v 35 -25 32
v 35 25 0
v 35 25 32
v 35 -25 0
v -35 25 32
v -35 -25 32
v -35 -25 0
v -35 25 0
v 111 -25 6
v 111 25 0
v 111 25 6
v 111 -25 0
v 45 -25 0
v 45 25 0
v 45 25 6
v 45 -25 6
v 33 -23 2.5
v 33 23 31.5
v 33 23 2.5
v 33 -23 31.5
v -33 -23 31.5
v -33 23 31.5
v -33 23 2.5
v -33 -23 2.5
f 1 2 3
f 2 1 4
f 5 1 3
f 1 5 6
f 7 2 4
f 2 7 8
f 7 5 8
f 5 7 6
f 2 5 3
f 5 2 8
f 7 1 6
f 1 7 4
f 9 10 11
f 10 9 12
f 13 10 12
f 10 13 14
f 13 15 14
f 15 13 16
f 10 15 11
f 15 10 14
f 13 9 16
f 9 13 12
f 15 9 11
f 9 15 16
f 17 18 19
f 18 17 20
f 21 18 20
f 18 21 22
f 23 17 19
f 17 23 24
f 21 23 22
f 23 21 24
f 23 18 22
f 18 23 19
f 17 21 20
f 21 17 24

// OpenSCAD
// Two-part enclosure for a small electronics board (e.g. Arduino-based temperature logger)
// Prints together: box on the left, lid (upside down) on the right, with a 10 mm gap.

// ---------------- Parameters ----------------
box_x      = 70;    // box outer length (X)
box_y      = 50;    // box outer width (Y)
box_z      = 30;    // box height (Z)
wall       = 2;     // box wall thickness
floor      = 2;     // box floor thickness

lip_t      = 1.5;   // lid lip wall thickness
lip_h      = 4;     // lid lip height (from plate top)
lip_x      = 65.6;  // lid lip outer length (X)
lip_y      = 45.6;  // lid lip outer width (Y)
clearance  = 0.2;   // side clearance between lip and box opening

plate_t    = 2;     // lid plate thickness
gap        = 10;    // gap between box and lid on the bed

eps        = 0.5;   // cutter overshoot past faces
$fn        = 64;

// Derived
lip_x2 = lip_x + 2 * clearance;   // lip outer size with clearance
lip_y2 = lip_y + 2 * clearance;

// ---------------- Model ----------------
difference() {
    union() {
        // Part 1: Box (open top)
        translate([-box_x / 2, -box_y / 2, 0])
            cube([box_x, box_y, box_z + floor]);

        // Part 2: Lid (printed upside down: plate on bed, lip pointing up)
        translate([box_x / 2 + gap, -box_y / 2, 0])
            cube([lip_x2, box_y, plate_t]);
        translate([box_x / 2 + gap, -box_y / 2, plate_t])
            cube([lip_x2, box_y, lip_h]);
    }

    // Cut the lid lip into the box, leaving the clearance
    translate([-lip_x2 / 2, -lip_y2 / 2, floor + eps])
        cube([lip_x2, lip_y2, box_z - floor + 2 * eps]);
}
